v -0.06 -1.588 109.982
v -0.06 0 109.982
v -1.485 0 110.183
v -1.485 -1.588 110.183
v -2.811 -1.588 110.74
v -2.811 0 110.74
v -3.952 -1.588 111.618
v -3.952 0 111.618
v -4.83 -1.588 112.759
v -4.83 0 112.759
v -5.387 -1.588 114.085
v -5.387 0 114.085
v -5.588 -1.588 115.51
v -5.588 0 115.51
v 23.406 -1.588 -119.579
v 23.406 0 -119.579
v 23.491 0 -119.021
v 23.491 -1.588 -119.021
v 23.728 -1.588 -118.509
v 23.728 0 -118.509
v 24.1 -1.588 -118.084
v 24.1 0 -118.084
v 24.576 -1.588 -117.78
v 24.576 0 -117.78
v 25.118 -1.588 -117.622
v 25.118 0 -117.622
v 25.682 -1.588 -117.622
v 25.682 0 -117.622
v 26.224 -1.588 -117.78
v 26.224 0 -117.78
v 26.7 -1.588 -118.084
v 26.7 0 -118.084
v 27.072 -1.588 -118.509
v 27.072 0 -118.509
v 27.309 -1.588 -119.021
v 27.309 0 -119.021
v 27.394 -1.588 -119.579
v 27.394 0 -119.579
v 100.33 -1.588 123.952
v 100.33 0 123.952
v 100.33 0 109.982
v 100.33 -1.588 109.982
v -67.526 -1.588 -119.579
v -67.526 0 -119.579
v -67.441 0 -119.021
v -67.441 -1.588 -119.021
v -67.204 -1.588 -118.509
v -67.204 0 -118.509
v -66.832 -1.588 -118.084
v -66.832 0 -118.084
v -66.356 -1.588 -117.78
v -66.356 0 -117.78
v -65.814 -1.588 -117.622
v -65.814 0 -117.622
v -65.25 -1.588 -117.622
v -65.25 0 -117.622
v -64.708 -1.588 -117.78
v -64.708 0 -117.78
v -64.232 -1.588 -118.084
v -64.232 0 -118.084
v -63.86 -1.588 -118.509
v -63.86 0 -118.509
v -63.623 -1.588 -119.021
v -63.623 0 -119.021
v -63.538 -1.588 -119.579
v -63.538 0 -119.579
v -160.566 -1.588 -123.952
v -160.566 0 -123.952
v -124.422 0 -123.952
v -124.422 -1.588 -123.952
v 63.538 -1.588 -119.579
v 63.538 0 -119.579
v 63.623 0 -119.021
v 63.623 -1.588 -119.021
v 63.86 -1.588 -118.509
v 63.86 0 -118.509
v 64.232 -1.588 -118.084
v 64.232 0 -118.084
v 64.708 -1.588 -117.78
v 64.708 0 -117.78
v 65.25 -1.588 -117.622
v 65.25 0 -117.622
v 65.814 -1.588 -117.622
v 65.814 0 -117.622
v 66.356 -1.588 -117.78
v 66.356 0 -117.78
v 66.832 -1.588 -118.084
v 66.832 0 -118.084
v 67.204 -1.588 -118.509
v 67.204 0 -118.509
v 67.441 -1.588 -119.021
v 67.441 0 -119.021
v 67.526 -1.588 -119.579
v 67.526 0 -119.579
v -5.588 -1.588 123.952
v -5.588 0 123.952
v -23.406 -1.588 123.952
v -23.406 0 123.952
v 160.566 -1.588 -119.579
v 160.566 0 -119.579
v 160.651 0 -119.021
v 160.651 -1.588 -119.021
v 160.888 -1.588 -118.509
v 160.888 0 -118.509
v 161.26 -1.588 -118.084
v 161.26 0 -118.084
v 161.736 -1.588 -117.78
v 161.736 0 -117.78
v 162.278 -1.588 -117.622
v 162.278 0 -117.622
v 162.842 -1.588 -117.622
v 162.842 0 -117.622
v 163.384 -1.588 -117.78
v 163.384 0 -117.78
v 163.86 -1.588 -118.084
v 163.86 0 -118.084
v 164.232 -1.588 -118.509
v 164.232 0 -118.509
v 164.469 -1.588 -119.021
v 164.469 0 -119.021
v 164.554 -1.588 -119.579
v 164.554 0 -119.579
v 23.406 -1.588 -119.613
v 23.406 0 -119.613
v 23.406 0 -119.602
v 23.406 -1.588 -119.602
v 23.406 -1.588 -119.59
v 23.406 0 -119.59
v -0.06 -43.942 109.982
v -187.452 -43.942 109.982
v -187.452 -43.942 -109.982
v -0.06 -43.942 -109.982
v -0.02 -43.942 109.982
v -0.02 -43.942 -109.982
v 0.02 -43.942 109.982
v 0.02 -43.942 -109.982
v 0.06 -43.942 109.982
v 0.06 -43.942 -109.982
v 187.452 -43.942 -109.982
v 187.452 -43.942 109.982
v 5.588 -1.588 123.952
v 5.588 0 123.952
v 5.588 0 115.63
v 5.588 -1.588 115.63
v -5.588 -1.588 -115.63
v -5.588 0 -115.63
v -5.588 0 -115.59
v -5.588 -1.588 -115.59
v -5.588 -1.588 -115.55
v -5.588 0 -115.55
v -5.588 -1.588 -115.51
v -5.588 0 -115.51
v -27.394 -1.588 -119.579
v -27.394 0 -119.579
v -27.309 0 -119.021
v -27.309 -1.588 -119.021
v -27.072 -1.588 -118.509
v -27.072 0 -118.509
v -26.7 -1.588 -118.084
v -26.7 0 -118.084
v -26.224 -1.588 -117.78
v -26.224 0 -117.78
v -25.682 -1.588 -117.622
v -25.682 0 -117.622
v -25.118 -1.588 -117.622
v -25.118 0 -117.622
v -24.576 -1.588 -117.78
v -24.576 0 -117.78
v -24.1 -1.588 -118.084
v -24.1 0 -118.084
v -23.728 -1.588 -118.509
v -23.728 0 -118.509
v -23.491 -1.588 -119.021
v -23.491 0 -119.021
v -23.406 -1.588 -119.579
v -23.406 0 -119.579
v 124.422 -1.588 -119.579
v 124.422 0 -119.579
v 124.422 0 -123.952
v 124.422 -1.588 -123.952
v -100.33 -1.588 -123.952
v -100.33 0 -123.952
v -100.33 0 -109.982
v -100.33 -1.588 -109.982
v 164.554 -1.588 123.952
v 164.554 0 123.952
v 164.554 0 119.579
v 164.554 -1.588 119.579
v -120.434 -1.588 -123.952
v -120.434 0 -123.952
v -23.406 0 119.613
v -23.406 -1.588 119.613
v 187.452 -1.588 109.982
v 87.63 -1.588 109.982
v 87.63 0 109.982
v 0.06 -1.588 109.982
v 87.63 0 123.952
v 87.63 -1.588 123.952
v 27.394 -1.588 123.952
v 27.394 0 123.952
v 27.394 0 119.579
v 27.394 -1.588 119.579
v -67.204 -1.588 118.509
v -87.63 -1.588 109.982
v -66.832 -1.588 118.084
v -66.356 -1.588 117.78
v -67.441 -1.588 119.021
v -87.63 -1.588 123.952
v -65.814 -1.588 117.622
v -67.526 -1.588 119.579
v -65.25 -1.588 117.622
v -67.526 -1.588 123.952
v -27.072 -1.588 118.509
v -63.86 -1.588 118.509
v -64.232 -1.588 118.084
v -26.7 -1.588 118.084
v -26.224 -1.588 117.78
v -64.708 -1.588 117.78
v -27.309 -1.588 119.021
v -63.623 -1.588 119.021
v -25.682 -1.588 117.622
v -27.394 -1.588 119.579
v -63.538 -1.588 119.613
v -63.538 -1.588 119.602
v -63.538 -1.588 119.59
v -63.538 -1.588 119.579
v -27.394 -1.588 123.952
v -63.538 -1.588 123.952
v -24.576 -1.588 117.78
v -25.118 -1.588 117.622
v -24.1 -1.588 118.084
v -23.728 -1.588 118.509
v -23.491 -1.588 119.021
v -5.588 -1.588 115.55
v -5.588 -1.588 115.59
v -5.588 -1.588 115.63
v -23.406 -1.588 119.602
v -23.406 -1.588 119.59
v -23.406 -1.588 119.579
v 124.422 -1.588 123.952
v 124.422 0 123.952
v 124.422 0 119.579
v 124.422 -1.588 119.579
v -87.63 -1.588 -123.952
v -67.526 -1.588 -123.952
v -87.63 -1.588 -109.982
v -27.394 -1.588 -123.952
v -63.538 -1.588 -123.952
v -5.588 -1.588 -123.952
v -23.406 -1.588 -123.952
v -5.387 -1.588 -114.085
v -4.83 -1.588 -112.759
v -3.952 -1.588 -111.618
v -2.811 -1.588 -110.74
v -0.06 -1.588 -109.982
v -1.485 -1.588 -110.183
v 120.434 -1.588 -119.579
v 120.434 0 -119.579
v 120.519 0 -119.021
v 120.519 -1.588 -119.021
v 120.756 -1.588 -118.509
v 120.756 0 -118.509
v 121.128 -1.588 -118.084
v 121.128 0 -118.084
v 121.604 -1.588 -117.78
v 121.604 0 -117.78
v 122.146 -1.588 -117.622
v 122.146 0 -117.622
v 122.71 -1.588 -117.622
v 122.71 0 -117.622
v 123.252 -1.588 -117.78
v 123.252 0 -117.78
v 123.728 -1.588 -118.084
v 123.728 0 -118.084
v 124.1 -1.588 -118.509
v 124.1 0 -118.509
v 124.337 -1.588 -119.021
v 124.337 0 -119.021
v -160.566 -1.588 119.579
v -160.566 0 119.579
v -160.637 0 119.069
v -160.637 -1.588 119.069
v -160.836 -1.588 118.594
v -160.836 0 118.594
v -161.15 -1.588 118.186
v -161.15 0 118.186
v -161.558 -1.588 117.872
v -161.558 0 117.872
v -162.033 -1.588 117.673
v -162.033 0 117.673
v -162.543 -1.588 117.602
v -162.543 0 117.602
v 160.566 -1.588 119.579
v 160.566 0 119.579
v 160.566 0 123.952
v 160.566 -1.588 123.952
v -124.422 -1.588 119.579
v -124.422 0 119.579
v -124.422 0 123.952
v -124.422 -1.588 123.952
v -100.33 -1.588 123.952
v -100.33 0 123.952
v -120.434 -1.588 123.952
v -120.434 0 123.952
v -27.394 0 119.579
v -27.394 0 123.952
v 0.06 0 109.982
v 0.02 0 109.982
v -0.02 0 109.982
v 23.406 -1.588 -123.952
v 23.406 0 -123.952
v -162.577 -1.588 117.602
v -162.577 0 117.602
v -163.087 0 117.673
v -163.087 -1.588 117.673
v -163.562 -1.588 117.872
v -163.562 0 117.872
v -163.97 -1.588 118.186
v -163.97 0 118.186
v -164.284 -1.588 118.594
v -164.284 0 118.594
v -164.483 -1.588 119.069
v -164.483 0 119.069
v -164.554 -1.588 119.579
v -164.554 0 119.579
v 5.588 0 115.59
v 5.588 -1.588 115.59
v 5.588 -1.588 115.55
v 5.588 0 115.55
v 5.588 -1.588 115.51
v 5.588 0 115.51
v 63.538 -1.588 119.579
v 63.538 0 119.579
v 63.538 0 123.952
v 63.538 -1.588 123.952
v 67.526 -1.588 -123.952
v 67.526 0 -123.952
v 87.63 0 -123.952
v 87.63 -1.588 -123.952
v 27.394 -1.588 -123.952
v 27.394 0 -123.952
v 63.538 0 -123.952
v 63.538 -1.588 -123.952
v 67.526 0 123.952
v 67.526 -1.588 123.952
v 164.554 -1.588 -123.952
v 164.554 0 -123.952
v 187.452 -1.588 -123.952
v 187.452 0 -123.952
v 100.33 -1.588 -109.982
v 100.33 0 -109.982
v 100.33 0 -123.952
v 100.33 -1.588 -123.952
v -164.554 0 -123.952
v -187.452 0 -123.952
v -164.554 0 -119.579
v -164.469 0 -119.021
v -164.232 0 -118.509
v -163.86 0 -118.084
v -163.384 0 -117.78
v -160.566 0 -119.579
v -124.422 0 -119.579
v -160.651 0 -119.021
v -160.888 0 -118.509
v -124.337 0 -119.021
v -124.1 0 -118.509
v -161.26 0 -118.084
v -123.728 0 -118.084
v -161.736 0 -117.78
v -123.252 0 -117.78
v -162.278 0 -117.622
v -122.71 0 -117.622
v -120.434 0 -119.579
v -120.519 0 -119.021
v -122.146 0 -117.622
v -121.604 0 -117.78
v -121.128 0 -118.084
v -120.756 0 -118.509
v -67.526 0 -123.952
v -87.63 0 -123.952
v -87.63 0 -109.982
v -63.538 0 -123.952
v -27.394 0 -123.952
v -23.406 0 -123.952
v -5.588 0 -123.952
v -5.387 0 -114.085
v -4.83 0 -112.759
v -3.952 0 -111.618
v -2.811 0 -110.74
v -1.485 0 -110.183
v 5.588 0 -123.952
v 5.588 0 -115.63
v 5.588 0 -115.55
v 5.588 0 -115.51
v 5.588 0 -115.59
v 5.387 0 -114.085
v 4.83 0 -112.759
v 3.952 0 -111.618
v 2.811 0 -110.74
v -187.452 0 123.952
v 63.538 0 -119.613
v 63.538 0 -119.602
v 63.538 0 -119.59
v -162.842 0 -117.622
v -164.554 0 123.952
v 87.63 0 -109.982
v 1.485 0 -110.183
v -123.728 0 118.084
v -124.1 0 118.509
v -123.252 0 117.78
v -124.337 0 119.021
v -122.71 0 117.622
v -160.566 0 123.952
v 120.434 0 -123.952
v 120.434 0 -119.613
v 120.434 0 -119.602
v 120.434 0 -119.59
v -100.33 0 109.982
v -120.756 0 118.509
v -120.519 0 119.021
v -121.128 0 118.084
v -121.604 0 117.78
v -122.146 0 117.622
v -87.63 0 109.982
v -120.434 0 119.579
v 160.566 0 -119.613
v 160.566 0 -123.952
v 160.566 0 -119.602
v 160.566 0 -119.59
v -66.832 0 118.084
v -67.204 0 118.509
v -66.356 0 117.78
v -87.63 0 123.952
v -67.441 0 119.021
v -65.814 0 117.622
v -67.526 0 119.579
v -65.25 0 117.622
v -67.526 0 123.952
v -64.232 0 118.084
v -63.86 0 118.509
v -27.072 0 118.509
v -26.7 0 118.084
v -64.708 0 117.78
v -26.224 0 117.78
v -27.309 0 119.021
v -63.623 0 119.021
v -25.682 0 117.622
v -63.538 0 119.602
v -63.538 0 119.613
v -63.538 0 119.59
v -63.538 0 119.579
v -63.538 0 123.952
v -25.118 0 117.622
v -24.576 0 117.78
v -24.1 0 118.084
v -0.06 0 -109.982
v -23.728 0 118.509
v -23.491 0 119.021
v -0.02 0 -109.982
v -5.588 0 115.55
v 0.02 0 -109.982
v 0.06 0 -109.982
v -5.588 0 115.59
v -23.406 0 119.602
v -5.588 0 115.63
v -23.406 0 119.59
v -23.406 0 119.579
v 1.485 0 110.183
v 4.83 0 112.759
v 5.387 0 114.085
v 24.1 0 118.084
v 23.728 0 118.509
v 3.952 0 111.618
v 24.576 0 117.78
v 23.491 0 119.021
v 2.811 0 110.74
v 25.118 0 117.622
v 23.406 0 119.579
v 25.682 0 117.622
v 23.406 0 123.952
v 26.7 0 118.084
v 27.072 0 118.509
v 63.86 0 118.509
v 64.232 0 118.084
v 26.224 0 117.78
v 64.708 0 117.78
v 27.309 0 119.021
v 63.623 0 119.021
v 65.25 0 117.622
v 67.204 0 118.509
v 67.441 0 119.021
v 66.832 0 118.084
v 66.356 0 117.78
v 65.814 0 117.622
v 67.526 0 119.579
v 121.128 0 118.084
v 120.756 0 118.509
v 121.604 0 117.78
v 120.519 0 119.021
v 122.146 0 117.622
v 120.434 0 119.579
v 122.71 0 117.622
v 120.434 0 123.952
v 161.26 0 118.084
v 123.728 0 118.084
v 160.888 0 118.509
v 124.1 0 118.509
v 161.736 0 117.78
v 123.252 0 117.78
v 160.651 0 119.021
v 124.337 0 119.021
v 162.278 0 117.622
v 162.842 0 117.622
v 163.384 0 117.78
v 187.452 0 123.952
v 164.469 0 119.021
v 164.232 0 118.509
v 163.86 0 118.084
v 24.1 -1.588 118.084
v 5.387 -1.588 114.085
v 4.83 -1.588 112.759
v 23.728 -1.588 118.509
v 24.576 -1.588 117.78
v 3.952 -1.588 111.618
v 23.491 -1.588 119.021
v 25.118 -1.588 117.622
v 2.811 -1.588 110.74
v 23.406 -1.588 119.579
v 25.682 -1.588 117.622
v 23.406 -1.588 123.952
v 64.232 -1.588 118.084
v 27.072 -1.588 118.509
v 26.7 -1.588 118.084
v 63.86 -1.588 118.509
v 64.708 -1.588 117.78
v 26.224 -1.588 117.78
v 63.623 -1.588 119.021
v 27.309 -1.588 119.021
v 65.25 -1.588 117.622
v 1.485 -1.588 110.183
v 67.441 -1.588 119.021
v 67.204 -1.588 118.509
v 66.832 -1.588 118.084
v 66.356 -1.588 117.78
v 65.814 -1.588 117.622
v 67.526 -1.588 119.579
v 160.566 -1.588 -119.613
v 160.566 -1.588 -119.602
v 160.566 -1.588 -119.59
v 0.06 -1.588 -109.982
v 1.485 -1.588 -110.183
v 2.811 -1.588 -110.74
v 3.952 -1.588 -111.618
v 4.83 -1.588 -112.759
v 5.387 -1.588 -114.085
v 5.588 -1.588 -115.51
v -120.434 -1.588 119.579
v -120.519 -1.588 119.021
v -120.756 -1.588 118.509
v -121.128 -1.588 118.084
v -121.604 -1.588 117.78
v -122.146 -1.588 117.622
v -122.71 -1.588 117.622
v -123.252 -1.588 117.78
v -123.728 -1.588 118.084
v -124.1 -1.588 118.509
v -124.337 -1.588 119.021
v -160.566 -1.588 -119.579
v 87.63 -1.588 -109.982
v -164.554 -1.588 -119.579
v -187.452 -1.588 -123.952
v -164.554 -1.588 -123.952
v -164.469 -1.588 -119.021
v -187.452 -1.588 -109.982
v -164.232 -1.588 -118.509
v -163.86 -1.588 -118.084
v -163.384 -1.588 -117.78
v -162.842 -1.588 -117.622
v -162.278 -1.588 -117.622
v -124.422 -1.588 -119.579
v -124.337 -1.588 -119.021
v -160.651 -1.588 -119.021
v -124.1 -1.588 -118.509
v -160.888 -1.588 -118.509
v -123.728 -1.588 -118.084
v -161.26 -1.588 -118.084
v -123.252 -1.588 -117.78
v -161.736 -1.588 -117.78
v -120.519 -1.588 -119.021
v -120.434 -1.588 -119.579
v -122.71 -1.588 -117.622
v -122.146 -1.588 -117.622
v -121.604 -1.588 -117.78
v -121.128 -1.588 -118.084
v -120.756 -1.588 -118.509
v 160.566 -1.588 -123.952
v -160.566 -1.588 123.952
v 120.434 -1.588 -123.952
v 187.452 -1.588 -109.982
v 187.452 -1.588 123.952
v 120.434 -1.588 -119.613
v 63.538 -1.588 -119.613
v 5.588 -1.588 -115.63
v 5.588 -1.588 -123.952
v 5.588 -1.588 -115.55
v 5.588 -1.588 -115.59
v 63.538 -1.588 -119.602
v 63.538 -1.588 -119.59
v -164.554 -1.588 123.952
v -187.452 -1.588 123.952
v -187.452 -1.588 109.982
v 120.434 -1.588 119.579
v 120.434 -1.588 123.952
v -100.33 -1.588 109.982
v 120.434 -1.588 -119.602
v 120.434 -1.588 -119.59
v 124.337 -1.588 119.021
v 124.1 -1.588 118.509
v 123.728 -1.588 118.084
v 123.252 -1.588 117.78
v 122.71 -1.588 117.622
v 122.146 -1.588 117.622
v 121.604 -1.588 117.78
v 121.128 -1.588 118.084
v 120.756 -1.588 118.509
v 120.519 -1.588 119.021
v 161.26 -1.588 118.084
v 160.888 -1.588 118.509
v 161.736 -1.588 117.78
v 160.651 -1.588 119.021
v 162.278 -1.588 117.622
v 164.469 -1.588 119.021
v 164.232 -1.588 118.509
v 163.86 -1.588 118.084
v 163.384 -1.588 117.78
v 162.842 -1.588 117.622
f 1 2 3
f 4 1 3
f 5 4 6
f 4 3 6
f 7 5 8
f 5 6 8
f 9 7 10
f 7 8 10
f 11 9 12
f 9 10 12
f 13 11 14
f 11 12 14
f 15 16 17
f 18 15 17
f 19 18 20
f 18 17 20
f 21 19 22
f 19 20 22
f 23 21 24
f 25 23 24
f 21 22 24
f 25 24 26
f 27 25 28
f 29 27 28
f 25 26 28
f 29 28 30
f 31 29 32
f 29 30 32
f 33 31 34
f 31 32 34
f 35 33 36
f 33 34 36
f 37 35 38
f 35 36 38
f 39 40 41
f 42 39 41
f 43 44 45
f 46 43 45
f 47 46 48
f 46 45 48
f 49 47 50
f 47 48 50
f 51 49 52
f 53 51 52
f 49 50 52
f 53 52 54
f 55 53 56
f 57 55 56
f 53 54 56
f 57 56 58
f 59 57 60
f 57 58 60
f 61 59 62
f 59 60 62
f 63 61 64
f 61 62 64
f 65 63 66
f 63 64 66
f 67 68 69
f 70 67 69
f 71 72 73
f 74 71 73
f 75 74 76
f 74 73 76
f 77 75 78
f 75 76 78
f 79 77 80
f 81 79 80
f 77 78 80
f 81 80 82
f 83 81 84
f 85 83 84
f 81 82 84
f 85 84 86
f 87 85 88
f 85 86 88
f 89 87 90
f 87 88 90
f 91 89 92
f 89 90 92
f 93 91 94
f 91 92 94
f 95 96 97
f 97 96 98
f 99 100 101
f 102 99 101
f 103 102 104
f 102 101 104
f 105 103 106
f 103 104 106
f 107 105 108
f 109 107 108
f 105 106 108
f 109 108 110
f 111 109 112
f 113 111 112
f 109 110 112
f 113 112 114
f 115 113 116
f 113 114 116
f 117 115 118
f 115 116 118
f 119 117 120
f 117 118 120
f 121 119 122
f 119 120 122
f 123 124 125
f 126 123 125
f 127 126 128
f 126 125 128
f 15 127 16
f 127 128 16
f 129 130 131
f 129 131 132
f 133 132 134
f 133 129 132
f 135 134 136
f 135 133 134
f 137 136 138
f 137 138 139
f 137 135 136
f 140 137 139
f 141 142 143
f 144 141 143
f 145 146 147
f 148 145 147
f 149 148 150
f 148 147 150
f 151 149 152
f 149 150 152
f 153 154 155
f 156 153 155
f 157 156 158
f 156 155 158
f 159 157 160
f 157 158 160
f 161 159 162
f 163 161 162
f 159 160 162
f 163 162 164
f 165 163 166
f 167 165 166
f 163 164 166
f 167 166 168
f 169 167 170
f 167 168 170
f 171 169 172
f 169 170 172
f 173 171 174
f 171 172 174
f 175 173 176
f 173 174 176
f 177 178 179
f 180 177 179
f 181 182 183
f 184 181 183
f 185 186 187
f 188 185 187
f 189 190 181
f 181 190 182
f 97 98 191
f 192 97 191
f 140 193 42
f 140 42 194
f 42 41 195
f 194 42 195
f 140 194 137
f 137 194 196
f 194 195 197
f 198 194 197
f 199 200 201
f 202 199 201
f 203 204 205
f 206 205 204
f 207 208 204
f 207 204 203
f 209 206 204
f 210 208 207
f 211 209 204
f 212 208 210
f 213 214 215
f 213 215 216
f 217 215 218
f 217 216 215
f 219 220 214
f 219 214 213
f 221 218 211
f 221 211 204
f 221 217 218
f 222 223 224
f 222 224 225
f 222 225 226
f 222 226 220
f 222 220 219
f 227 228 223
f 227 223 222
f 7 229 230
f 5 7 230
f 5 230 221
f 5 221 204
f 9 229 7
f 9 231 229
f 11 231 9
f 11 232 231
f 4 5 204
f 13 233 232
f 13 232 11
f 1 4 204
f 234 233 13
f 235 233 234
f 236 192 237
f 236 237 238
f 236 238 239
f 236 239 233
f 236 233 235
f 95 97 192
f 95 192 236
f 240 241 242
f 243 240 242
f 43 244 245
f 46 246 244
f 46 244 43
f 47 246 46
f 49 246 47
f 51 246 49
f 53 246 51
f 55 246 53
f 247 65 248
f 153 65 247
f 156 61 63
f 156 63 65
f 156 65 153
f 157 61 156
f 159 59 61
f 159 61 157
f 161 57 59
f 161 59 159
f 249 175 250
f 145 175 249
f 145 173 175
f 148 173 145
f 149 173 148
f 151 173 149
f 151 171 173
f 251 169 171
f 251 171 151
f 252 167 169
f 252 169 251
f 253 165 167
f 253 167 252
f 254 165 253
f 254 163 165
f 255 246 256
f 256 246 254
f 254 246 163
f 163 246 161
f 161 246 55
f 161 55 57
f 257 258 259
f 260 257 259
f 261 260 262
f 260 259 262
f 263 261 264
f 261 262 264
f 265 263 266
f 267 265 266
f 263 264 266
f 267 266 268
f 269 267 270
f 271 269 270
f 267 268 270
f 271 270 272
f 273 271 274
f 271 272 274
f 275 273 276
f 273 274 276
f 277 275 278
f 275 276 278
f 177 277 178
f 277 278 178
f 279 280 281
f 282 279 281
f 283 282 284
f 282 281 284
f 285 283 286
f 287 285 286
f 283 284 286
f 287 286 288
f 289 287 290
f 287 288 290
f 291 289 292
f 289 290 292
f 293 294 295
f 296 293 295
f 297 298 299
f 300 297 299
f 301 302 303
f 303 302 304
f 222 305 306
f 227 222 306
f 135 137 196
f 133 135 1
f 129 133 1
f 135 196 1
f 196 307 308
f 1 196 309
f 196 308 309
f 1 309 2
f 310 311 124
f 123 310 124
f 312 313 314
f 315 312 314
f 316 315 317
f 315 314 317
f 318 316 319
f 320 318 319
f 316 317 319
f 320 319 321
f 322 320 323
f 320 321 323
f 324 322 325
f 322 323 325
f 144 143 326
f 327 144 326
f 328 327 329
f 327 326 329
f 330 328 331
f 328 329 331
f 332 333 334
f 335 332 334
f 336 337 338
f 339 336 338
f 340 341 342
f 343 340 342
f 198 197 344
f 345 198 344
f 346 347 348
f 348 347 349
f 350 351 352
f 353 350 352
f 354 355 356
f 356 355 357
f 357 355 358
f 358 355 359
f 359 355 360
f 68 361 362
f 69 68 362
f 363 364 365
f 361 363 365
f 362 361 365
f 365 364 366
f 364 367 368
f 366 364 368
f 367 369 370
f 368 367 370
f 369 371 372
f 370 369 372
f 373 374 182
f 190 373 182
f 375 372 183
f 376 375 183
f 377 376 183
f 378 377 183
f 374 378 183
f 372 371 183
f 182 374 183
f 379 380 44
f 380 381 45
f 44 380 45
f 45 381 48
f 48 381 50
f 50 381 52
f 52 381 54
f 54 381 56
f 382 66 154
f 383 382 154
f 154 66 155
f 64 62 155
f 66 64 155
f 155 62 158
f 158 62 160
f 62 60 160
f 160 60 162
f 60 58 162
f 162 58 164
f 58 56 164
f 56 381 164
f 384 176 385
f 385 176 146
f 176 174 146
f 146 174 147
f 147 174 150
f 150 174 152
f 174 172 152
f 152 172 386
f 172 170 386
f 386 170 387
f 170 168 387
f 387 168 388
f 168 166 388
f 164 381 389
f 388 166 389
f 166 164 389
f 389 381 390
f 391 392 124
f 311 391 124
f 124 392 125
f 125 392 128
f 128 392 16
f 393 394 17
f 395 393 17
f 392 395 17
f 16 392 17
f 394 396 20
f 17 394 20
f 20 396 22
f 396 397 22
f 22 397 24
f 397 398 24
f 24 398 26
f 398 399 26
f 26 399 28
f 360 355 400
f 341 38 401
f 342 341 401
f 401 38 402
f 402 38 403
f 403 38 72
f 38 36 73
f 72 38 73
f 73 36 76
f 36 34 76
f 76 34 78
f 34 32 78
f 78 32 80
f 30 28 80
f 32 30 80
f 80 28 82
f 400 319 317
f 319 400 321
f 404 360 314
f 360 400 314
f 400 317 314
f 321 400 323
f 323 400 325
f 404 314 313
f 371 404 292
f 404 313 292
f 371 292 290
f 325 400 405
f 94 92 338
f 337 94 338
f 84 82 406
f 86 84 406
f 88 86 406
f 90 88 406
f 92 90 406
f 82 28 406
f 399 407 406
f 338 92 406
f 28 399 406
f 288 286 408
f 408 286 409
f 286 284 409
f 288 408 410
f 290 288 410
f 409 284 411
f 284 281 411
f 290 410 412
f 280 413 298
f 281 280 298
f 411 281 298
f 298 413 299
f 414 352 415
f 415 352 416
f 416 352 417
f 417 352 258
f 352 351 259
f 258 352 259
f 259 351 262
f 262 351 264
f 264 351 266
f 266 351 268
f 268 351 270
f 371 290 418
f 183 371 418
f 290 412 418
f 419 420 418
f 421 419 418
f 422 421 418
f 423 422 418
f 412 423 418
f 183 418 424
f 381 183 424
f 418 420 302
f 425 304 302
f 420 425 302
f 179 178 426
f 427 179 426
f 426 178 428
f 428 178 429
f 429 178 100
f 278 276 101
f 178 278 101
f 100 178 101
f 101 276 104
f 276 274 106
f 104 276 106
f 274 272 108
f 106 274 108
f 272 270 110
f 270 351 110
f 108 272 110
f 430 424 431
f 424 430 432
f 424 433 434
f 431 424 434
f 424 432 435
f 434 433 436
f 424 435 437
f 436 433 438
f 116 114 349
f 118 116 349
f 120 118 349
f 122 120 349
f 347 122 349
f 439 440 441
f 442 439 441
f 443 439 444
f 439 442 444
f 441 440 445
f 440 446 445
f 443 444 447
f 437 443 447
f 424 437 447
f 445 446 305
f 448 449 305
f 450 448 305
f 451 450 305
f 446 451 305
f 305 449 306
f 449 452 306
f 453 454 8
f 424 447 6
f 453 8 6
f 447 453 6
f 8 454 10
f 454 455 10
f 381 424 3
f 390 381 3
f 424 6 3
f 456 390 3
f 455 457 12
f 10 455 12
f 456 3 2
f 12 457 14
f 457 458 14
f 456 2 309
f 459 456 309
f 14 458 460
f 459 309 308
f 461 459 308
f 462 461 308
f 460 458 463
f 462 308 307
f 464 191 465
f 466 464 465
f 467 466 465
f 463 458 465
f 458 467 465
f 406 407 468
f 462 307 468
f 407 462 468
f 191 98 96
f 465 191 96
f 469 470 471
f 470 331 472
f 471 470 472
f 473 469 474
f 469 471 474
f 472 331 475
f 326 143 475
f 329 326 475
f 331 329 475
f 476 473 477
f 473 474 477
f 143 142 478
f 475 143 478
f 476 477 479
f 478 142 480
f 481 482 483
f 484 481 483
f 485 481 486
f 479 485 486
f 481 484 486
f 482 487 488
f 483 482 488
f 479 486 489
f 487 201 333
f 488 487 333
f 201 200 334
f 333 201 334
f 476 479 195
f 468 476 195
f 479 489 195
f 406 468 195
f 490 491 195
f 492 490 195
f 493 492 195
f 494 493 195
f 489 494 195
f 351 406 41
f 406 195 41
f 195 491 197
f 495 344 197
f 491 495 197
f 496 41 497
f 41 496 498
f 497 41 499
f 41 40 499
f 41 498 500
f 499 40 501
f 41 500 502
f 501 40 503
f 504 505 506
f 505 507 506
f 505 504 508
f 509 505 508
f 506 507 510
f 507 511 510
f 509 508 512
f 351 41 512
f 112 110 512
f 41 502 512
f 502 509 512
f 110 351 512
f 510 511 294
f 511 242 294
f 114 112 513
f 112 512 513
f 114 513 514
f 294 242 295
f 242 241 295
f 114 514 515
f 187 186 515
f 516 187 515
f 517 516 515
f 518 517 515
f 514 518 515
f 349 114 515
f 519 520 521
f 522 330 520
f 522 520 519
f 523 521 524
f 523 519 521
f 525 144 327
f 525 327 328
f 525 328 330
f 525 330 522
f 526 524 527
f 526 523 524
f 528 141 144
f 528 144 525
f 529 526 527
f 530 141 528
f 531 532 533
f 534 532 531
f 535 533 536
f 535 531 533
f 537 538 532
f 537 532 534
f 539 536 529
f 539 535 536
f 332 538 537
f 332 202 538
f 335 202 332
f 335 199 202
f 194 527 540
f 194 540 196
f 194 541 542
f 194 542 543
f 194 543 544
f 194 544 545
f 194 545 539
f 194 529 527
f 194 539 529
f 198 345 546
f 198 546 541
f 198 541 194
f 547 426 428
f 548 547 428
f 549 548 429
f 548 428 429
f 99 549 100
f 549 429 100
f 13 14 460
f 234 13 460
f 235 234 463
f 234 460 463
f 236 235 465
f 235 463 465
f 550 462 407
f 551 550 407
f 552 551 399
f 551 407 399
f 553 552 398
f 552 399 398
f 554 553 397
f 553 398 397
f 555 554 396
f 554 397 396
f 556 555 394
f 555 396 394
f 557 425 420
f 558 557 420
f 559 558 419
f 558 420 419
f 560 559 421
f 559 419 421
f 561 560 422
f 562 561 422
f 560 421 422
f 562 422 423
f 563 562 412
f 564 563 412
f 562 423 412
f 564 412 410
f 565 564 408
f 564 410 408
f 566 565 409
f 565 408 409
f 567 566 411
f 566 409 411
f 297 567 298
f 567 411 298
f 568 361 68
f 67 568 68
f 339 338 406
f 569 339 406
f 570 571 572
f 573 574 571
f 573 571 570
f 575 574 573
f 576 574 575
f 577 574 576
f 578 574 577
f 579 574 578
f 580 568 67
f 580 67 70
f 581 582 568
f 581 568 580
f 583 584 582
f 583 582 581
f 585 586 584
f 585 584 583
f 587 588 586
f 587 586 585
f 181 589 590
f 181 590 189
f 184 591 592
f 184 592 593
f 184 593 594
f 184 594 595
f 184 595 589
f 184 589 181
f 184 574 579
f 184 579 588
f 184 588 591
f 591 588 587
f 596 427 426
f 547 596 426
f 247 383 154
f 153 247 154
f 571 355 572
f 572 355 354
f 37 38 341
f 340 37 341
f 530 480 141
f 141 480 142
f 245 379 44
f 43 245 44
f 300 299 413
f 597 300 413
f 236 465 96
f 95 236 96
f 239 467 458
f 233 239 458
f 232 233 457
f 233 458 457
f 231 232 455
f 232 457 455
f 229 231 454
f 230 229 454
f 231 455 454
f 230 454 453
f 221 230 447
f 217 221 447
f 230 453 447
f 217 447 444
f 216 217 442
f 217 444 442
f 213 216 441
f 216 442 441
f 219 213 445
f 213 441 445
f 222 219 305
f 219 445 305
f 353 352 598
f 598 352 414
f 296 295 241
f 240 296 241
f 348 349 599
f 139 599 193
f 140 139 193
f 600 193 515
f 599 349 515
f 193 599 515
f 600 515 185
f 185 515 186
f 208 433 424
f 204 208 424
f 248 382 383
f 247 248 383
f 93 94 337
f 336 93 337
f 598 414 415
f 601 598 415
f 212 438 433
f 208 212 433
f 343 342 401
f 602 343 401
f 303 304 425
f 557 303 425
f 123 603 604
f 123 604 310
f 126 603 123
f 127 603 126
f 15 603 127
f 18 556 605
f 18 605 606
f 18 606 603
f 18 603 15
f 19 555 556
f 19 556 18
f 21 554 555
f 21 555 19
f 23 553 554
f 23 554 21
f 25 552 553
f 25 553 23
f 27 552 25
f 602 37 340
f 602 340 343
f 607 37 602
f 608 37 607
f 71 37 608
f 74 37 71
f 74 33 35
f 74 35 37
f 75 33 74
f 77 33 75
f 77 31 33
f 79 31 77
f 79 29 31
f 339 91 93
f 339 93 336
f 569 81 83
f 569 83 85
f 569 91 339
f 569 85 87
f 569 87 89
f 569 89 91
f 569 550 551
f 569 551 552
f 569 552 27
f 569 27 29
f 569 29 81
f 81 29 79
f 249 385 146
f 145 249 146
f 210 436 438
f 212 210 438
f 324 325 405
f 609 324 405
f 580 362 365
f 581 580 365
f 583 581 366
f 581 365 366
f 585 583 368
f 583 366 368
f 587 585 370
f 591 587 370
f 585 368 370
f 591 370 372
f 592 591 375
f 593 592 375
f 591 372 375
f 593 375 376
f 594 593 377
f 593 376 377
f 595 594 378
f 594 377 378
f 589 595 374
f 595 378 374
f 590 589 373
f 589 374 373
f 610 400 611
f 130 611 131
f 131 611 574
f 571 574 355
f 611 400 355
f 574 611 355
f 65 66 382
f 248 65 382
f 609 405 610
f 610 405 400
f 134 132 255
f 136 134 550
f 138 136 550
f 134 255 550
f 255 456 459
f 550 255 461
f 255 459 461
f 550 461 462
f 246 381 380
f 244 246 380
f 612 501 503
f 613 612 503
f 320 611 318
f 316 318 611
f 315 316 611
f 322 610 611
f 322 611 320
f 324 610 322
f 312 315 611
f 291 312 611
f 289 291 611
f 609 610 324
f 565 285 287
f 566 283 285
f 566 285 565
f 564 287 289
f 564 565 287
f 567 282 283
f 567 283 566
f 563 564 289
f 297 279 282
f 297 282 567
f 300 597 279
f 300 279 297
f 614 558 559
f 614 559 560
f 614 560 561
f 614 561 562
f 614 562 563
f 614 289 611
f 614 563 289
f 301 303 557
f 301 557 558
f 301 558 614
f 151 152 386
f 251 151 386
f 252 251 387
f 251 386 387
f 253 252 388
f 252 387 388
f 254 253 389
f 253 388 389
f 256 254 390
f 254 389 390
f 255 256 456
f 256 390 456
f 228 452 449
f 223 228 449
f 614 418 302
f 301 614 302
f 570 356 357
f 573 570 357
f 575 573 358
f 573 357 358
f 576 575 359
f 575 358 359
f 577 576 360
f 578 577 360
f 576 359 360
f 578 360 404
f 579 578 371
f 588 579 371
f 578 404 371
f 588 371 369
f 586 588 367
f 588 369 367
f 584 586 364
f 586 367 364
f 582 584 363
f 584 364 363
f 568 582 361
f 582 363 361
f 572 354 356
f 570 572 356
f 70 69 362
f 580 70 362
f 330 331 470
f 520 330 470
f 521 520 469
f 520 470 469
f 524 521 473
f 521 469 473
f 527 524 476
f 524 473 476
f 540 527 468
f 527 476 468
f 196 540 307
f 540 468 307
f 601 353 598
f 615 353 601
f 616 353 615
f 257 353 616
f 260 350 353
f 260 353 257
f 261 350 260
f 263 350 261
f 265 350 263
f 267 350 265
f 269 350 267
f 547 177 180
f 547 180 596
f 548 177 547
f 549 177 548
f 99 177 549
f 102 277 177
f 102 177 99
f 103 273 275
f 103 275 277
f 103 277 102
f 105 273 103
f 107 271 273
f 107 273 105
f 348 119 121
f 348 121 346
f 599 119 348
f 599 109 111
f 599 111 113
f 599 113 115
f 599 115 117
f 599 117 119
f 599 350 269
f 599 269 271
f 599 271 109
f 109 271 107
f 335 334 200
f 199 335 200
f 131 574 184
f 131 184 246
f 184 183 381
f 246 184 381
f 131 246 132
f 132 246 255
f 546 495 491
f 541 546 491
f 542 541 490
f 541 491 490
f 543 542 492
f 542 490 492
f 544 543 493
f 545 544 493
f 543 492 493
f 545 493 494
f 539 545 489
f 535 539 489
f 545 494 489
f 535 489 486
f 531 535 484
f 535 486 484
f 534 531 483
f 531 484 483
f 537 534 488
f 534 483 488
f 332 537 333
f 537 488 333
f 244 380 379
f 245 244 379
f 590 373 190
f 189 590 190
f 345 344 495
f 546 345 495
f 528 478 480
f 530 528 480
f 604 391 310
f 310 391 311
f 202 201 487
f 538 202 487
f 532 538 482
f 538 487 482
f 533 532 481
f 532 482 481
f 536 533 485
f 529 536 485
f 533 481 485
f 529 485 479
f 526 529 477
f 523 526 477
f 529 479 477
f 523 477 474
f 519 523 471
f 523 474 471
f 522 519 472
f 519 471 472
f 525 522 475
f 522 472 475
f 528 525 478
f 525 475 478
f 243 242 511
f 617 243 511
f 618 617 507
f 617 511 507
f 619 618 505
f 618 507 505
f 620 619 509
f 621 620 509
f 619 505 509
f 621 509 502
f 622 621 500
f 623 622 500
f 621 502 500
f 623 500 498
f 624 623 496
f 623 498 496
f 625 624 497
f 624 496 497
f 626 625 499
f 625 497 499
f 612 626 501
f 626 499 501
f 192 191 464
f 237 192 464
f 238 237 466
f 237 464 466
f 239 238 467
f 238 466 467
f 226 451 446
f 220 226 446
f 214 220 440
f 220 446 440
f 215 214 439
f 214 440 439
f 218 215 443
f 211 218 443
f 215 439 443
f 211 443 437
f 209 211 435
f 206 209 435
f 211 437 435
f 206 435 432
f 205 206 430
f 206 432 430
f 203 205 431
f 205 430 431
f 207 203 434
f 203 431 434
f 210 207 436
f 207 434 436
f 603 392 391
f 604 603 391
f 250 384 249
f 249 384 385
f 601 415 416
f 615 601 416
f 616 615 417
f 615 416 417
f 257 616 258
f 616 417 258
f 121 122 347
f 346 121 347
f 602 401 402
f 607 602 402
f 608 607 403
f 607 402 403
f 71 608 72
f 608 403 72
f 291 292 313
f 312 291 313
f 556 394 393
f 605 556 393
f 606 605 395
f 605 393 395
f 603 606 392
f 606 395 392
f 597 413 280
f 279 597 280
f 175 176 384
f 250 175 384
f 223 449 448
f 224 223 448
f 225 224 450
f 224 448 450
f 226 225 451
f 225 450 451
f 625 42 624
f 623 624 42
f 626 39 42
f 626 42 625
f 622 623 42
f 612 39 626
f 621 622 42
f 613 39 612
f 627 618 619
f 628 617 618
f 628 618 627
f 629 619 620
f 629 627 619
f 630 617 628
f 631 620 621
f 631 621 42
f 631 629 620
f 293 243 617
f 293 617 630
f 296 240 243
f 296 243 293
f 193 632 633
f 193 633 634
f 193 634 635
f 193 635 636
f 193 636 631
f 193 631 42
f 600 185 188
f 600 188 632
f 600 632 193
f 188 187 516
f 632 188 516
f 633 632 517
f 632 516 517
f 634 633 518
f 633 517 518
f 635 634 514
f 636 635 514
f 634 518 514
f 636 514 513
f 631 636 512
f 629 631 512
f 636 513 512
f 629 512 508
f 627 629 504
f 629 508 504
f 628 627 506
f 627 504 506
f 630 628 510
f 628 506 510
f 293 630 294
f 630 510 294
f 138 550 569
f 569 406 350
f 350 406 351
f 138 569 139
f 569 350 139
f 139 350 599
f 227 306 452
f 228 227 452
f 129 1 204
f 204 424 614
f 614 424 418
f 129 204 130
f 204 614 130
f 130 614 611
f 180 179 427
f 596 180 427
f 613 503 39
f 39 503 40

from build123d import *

# Parameters (mm, degrees)
F1_DEPTH = 43.942
F2_DEPTH = 1.5875


with BuildPart() as f1:
    # F0 (on Front) → F1 (new body)
    with BuildSketch(Plane.XZ):
        with BuildLine():
            Line((-187.452, 109.982), (-187.452, -109.982))
            Line((-187.452, -109.982), (-100.33, -109.982))
            Line((-100.33, -109.982), (-87.630004, -109.982))
            Line((-87.630004, -109.982), (-0.060038, -109.982))
            ThreePointArc((-0.060038, -109.982), (0, -109.981677), (0.060038, -109.982))
            Line((0.060038, -109.982), (87.630004, -109.982))
            Line((87.630004, -109.982), (100.33, -109.982))
            Line((100.33, -109.982), (187.452, -109.982))
            Line((187.452, -109.982), (187.452, 109.982))
            Line((187.452, 109.982), (100.33, 109.982))
            Line((100.33, 109.982), (87.630004, 109.982))
            Line((87.630004, 109.982), (0.060038, 109.982))
            ThreePointArc((0.060038, 109.982), (0, 109.981677), (-0.060038, 109.982))
            Line((-0.060038, 109.982), (-87.630004, 109.982))
            Line((-87.630004, 109.982), (-100.33, 109.982))
            Line((-100.33, 109.982), (-187.452, 109.982))
        make_face()
    extrude(amount=F1_DEPTH)

    # F0 (on Front) → F2 (join)
    with BuildSketch(Plane.XZ):
        with BuildLine():
            Line((-187.452, 123.952), (-187.452, 109.982))
            Line((-187.452, 109.982), (-100.33, 109.982))
            Line((-100.33, 109.982), (-100.33, 123.952))
            Line((-100.33, 123.952), (-120.4341, 123.952))
            Line((-120.4341, 123.952), (-120.4341, 119.612701))
            Line((-120.4341, 119.612701), (-120.4341, 119.579099))
            ThreePointArc((-120.4341, 119.579099), (-122.428, 117.601929), (-124.4219, 119.579099))
            Line((-124.4219, 119.579099), (-124.4219, 123.952))
            Line((-124.4219, 123.952), (-160.5661, 123.952))
            Line((-160.5661, 123.952), (-160.5661, 119.612701))
            Line((-160.5661, 119.612701), (-160.5661, 119.579099))
            ThreePointArc((-160.5661, 119.579099), (-161.15005, 118.18595), (-162.543199, 117.602))
            Line((-162.543199, 117.602), (-162.576801, 117.602))
            ThreePointArc((-162.576801, 117.602), (-163.96995, 118.18595), (-164.5539, 119.579099))
            Line((-164.5539, 119.579099), (-164.5539, 123.952))
            Line((-164.5539, 123.952), (-187.452, 123.952))
        make_face()
        with BuildLine():
            Line((-187.452, -109.982), (-187.452, -123.952))
            Line((-187.452, -123.952), (-164.5539, -123.952))
            Line((-164.5539, -123.952), (-164.5539, -119.579099))
            ThreePointArc((-164.5539, -119.579099), (-162.56, -117.601929), (-160.5661, -119.579099))
            Line((-160.5661, -119.579099), (-160.5661, -119.612701))
            Line((-160.5661, -119.612701), (-160.5661, -123.952))
            Line((-160.5661, -123.952), (-124.4219, -123.952))
            Line((-124.4219, -123.952), (-124.4219, -119.579099))
            ThreePointArc((-124.4219, -119.579099), (-122.428, -117.601929), (-120.4341, -119.579099))
            Line((-120.4341, -119.579099), (-120.4341, -119.612701))
            Line((-120.4341, -119.612701), (-120.4341, -123.952))
            Line((-120.4341, -123.952), (-100.33, -123.952))
            Line((-100.33, -123.952), (-100.33, -109.982))
            Line((-100.33, -109.982), (-187.452, -109.982))
        make_face()
        with BuildLine():
            ThreePointArc((5.588, 115.509962), (3.951541, 111.618459), (0.060038, 109.982))
            Line((0.060038, 109.982), (87.630004, 109.982))
            Line((87.630004, 109.982), (87.630004, 123.952))
            Line((87.630004, 123.952), (67.5259, 123.952))
            Line((67.5259, 123.952), (67.5259, 119.579099))
            ThreePointArc((67.5259, 119.579099), (65.532, 117.601929), (63.5381, 119.579099))
            Line((63.5381, 119.579099), (63.5381, 119.612701))
            Line((63.5381, 119.612701), (63.5381, 123.952))
            Line((63.5381, 123.952), (27.3939, 123.952))
            Line((27.3939, 123.952), (27.3939, 119.579099))
            ThreePointArc((27.3939, 119.579099), (25.4, 117.601929), (23.4061, 119.579099))
            Line((23.4061, 119.579099), (23.4061, 119.612701))
            Line((23.4061, 119.612701), (23.4061, 123.952))
            Line((23.4061, 123.952), (5.588, 123.952))
            Line((5.588, 123.952), (5.588, 115.630038))
            ThreePointArc((5.588, 115.630038), (5.588323, 115.57), (5.588, 115.509962))
        make_face()
        with BuildLine():
            Line((187.452, -109.982), (100.33, -109.982))
            Line((100.33, -109.982), (100.33, -123.952))
            Line((100.33, -123.952), (120.4341, -123.952))
            Line((120.4341, -123.952), (120.4341, -119.612701))
            ThreePointArc((120.4341, -119.612701), (120.434029, -119.5959), (120.4341, -119.579099))
            ThreePointArc((120.4341, -119.579099), (122.428, -117.601929), (124.4219, -119.579099))
            Line((124.4219, -119.579099), (124.4219, -123.952))
            Line((124.4219, -123.952), (160.5661, -123.952))
            Line((160.5661, -123.952), (160.5661, -119.612701))
            ThreePointArc((160.5661, -119.612701), (160.566029, -119.5959), (160.5661, -119.579099))
            ThreePointArc((160.5661, -119.579099), (162.56, -117.601929), (164.5539, -119.579099))
            Line((164.5539, -119.579099), (164.5539, -123.952))
            Line((164.5539, -123.952), (187.452, -123.952))
            Line((187.452, -123.952), (187.452, -109.982))
        make_face()
        with BuildLine():
            Line((-87.630004, 123.952), (-87.630004, 109.982))
            Line((-87.630004, 109.982), (-0.060038, 109.982))
            ThreePointArc((-0.060038, 109.982), (-3.951541, 111.618459), (-5.588, 115.509962))
            ThreePointArc((-5.588, 115.509962), (-5.588323, 115.57), (-5.588, 115.630038))
            Line((-5.588, 115.630038), (-5.588, 123.952))
            Line((-5.588, 123.952), (-23.4061, 123.952))
            Line((-23.4061, 123.952), (-23.4061, 119.612701))
            ThreePointArc((-23.4061, 119.612701), (-23.406029, 119.5959), (-23.4061, 119.579099))
            ThreePointArc((-23.4061, 119.579099), (-25.4, 117.601929), (-27.3939, 119.579099))
            Line((-27.3939, 119.579099), (-27.3939, 123.952))
            Line((-27.3939, 123.952), (-63.5381, 123.952))
            Line((-63.5381, 123.952), (-63.5381, 119.612701))
            ThreePointArc((-63.5381, 119.612701), (-63.538029, 119.5959), (-63.5381, 119.579099))
            ThreePointArc((-63.5381, 119.579099), (-65.532, 117.601929), (-67.5259, 119.579099))
            Line((-67.5259, 119.579099), (-67.5259, 123.952))
            Line((-67.5259, 123.952), (-87.630004, 123.952))
        make_face()
        with BuildLine():
            Line((-0.060038, -109.982), (-87.630004, -109.982))
            Line((-87.630004, -109.982), (-87.630004, -123.952))
            Line((-87.630004, -123.952), (-67.5259, -123.952))
            Line((-67.5259, -123.952), (-67.5259, -119.579099))
            ThreePointArc((-67.5259, -119.579099), (-65.532, -117.601929), (-63.5381, -119.579099))
            Line((-63.5381, -119.579099), (-63.5381, -119.612701))
            Line((-63.5381, -119.612701), (-63.5381, -123.952))
            Line((-63.5381, -123.952), (-27.3939, -123.952))
            Line((-27.3939, -123.952), (-27.3939, -119.579099))
            ThreePointArc((-27.3939, -119.579099), (-25.4, -117.601929), (-23.4061, -119.579099))
            Line((-23.4061, -119.579099), (-23.4061, -119.612701))
            Line((-23.4061, -119.612701), (-23.4061, -123.952))
            Line((-23.4061, -123.952), (-5.588, -123.952))
            Line((-5.588, -123.952), (-5.588, -115.630038))
            ThreePointArc((-5.588, -115.630038), (-5.588323, -115.57), (-5.588, -115.509962))
            ThreePointArc((-5.588, -115.509962), (-3.951541, -111.618459), (-0.060038, -109.982))
        make_face()
        with BuildLine():
            Line((87.630004, -109.982), (0.060038, -109.982))
            ThreePointArc((0.060038, -109.982), (3.951541, -111.618459), (5.588, -115.509962))
            ThreePointArc((5.588, -115.509962), (5.588323, -115.57), (5.588, -115.630038))
            Line((5.588, -115.630038), (5.588, -123.952))
            Line((5.588, -123.952), (23.4061, -123.952))
            Line((23.4061, -123.952), (23.4061, -119.612701))
            ThreePointArc((23.4061, -119.612701), (23.406029, -119.5959), (23.4061, -119.579099))
            ThreePointArc((23.4061, -119.579099), (25.4, -117.601929), (27.3939, -119.579099))
            Line((27.3939, -119.579099), (27.3939, -123.952))
            Line((27.3939, -123.952), (63.5381, -123.952))
            Line((63.5381, -123.952), (63.5381, -119.612701))
            ThreePointArc((63.5381, -119.612701), (63.538029, -119.5959), (63.5381, -119.579099))
            ThreePointArc((63.5381, -119.579099), (65.532, -117.601929), (67.5259, -119.579099))
            Line((67.5259, -119.579099), (67.5259, -123.952))
            Line((67.5259, -123.952), (87.630004, -123.952))
            Line((87.630004, -123.952), (87.630004, -109.982))
        make_face()
        with BuildLine():
            Line((100.33, 123.952), (100.33, 109.982))
            Line((100.33, 109.982), (187.452, 109.982))
            Line((187.452, 109.982), (187.452, 123.952))
            Line((187.452, 123.952), (164.5539, 123.952))
            Line((164.5539, 123.952), (164.5539, 119.579099))
            ThreePointArc((164.5539, 119.579099), (162.56, 117.601929), (160.5661, 119.579099))
            Line((160.5661, 119.579099), (160.5661, 119.612701))
            Line((160.5661, 119.612701), (160.5661, 123.952))
            Line((160.5661, 123.952), (124.4219, 123.952))
            Line((124.4219, 123.952), (124.4219, 119.579099))
            ThreePointArc((124.4219, 119.579099), (122.428, 117.601929), (120.4341, 119.579099))
            Line((120.4341, 119.579099), (120.4341, 119.612701))
            Line((120.4341, 119.612701), (120.4341, 123.952))
            Line((120.4341, 123.952), (100.33, 123.952))
        make_face()
    extrude(amount=F2_DEPTH)


solid = f1.part
